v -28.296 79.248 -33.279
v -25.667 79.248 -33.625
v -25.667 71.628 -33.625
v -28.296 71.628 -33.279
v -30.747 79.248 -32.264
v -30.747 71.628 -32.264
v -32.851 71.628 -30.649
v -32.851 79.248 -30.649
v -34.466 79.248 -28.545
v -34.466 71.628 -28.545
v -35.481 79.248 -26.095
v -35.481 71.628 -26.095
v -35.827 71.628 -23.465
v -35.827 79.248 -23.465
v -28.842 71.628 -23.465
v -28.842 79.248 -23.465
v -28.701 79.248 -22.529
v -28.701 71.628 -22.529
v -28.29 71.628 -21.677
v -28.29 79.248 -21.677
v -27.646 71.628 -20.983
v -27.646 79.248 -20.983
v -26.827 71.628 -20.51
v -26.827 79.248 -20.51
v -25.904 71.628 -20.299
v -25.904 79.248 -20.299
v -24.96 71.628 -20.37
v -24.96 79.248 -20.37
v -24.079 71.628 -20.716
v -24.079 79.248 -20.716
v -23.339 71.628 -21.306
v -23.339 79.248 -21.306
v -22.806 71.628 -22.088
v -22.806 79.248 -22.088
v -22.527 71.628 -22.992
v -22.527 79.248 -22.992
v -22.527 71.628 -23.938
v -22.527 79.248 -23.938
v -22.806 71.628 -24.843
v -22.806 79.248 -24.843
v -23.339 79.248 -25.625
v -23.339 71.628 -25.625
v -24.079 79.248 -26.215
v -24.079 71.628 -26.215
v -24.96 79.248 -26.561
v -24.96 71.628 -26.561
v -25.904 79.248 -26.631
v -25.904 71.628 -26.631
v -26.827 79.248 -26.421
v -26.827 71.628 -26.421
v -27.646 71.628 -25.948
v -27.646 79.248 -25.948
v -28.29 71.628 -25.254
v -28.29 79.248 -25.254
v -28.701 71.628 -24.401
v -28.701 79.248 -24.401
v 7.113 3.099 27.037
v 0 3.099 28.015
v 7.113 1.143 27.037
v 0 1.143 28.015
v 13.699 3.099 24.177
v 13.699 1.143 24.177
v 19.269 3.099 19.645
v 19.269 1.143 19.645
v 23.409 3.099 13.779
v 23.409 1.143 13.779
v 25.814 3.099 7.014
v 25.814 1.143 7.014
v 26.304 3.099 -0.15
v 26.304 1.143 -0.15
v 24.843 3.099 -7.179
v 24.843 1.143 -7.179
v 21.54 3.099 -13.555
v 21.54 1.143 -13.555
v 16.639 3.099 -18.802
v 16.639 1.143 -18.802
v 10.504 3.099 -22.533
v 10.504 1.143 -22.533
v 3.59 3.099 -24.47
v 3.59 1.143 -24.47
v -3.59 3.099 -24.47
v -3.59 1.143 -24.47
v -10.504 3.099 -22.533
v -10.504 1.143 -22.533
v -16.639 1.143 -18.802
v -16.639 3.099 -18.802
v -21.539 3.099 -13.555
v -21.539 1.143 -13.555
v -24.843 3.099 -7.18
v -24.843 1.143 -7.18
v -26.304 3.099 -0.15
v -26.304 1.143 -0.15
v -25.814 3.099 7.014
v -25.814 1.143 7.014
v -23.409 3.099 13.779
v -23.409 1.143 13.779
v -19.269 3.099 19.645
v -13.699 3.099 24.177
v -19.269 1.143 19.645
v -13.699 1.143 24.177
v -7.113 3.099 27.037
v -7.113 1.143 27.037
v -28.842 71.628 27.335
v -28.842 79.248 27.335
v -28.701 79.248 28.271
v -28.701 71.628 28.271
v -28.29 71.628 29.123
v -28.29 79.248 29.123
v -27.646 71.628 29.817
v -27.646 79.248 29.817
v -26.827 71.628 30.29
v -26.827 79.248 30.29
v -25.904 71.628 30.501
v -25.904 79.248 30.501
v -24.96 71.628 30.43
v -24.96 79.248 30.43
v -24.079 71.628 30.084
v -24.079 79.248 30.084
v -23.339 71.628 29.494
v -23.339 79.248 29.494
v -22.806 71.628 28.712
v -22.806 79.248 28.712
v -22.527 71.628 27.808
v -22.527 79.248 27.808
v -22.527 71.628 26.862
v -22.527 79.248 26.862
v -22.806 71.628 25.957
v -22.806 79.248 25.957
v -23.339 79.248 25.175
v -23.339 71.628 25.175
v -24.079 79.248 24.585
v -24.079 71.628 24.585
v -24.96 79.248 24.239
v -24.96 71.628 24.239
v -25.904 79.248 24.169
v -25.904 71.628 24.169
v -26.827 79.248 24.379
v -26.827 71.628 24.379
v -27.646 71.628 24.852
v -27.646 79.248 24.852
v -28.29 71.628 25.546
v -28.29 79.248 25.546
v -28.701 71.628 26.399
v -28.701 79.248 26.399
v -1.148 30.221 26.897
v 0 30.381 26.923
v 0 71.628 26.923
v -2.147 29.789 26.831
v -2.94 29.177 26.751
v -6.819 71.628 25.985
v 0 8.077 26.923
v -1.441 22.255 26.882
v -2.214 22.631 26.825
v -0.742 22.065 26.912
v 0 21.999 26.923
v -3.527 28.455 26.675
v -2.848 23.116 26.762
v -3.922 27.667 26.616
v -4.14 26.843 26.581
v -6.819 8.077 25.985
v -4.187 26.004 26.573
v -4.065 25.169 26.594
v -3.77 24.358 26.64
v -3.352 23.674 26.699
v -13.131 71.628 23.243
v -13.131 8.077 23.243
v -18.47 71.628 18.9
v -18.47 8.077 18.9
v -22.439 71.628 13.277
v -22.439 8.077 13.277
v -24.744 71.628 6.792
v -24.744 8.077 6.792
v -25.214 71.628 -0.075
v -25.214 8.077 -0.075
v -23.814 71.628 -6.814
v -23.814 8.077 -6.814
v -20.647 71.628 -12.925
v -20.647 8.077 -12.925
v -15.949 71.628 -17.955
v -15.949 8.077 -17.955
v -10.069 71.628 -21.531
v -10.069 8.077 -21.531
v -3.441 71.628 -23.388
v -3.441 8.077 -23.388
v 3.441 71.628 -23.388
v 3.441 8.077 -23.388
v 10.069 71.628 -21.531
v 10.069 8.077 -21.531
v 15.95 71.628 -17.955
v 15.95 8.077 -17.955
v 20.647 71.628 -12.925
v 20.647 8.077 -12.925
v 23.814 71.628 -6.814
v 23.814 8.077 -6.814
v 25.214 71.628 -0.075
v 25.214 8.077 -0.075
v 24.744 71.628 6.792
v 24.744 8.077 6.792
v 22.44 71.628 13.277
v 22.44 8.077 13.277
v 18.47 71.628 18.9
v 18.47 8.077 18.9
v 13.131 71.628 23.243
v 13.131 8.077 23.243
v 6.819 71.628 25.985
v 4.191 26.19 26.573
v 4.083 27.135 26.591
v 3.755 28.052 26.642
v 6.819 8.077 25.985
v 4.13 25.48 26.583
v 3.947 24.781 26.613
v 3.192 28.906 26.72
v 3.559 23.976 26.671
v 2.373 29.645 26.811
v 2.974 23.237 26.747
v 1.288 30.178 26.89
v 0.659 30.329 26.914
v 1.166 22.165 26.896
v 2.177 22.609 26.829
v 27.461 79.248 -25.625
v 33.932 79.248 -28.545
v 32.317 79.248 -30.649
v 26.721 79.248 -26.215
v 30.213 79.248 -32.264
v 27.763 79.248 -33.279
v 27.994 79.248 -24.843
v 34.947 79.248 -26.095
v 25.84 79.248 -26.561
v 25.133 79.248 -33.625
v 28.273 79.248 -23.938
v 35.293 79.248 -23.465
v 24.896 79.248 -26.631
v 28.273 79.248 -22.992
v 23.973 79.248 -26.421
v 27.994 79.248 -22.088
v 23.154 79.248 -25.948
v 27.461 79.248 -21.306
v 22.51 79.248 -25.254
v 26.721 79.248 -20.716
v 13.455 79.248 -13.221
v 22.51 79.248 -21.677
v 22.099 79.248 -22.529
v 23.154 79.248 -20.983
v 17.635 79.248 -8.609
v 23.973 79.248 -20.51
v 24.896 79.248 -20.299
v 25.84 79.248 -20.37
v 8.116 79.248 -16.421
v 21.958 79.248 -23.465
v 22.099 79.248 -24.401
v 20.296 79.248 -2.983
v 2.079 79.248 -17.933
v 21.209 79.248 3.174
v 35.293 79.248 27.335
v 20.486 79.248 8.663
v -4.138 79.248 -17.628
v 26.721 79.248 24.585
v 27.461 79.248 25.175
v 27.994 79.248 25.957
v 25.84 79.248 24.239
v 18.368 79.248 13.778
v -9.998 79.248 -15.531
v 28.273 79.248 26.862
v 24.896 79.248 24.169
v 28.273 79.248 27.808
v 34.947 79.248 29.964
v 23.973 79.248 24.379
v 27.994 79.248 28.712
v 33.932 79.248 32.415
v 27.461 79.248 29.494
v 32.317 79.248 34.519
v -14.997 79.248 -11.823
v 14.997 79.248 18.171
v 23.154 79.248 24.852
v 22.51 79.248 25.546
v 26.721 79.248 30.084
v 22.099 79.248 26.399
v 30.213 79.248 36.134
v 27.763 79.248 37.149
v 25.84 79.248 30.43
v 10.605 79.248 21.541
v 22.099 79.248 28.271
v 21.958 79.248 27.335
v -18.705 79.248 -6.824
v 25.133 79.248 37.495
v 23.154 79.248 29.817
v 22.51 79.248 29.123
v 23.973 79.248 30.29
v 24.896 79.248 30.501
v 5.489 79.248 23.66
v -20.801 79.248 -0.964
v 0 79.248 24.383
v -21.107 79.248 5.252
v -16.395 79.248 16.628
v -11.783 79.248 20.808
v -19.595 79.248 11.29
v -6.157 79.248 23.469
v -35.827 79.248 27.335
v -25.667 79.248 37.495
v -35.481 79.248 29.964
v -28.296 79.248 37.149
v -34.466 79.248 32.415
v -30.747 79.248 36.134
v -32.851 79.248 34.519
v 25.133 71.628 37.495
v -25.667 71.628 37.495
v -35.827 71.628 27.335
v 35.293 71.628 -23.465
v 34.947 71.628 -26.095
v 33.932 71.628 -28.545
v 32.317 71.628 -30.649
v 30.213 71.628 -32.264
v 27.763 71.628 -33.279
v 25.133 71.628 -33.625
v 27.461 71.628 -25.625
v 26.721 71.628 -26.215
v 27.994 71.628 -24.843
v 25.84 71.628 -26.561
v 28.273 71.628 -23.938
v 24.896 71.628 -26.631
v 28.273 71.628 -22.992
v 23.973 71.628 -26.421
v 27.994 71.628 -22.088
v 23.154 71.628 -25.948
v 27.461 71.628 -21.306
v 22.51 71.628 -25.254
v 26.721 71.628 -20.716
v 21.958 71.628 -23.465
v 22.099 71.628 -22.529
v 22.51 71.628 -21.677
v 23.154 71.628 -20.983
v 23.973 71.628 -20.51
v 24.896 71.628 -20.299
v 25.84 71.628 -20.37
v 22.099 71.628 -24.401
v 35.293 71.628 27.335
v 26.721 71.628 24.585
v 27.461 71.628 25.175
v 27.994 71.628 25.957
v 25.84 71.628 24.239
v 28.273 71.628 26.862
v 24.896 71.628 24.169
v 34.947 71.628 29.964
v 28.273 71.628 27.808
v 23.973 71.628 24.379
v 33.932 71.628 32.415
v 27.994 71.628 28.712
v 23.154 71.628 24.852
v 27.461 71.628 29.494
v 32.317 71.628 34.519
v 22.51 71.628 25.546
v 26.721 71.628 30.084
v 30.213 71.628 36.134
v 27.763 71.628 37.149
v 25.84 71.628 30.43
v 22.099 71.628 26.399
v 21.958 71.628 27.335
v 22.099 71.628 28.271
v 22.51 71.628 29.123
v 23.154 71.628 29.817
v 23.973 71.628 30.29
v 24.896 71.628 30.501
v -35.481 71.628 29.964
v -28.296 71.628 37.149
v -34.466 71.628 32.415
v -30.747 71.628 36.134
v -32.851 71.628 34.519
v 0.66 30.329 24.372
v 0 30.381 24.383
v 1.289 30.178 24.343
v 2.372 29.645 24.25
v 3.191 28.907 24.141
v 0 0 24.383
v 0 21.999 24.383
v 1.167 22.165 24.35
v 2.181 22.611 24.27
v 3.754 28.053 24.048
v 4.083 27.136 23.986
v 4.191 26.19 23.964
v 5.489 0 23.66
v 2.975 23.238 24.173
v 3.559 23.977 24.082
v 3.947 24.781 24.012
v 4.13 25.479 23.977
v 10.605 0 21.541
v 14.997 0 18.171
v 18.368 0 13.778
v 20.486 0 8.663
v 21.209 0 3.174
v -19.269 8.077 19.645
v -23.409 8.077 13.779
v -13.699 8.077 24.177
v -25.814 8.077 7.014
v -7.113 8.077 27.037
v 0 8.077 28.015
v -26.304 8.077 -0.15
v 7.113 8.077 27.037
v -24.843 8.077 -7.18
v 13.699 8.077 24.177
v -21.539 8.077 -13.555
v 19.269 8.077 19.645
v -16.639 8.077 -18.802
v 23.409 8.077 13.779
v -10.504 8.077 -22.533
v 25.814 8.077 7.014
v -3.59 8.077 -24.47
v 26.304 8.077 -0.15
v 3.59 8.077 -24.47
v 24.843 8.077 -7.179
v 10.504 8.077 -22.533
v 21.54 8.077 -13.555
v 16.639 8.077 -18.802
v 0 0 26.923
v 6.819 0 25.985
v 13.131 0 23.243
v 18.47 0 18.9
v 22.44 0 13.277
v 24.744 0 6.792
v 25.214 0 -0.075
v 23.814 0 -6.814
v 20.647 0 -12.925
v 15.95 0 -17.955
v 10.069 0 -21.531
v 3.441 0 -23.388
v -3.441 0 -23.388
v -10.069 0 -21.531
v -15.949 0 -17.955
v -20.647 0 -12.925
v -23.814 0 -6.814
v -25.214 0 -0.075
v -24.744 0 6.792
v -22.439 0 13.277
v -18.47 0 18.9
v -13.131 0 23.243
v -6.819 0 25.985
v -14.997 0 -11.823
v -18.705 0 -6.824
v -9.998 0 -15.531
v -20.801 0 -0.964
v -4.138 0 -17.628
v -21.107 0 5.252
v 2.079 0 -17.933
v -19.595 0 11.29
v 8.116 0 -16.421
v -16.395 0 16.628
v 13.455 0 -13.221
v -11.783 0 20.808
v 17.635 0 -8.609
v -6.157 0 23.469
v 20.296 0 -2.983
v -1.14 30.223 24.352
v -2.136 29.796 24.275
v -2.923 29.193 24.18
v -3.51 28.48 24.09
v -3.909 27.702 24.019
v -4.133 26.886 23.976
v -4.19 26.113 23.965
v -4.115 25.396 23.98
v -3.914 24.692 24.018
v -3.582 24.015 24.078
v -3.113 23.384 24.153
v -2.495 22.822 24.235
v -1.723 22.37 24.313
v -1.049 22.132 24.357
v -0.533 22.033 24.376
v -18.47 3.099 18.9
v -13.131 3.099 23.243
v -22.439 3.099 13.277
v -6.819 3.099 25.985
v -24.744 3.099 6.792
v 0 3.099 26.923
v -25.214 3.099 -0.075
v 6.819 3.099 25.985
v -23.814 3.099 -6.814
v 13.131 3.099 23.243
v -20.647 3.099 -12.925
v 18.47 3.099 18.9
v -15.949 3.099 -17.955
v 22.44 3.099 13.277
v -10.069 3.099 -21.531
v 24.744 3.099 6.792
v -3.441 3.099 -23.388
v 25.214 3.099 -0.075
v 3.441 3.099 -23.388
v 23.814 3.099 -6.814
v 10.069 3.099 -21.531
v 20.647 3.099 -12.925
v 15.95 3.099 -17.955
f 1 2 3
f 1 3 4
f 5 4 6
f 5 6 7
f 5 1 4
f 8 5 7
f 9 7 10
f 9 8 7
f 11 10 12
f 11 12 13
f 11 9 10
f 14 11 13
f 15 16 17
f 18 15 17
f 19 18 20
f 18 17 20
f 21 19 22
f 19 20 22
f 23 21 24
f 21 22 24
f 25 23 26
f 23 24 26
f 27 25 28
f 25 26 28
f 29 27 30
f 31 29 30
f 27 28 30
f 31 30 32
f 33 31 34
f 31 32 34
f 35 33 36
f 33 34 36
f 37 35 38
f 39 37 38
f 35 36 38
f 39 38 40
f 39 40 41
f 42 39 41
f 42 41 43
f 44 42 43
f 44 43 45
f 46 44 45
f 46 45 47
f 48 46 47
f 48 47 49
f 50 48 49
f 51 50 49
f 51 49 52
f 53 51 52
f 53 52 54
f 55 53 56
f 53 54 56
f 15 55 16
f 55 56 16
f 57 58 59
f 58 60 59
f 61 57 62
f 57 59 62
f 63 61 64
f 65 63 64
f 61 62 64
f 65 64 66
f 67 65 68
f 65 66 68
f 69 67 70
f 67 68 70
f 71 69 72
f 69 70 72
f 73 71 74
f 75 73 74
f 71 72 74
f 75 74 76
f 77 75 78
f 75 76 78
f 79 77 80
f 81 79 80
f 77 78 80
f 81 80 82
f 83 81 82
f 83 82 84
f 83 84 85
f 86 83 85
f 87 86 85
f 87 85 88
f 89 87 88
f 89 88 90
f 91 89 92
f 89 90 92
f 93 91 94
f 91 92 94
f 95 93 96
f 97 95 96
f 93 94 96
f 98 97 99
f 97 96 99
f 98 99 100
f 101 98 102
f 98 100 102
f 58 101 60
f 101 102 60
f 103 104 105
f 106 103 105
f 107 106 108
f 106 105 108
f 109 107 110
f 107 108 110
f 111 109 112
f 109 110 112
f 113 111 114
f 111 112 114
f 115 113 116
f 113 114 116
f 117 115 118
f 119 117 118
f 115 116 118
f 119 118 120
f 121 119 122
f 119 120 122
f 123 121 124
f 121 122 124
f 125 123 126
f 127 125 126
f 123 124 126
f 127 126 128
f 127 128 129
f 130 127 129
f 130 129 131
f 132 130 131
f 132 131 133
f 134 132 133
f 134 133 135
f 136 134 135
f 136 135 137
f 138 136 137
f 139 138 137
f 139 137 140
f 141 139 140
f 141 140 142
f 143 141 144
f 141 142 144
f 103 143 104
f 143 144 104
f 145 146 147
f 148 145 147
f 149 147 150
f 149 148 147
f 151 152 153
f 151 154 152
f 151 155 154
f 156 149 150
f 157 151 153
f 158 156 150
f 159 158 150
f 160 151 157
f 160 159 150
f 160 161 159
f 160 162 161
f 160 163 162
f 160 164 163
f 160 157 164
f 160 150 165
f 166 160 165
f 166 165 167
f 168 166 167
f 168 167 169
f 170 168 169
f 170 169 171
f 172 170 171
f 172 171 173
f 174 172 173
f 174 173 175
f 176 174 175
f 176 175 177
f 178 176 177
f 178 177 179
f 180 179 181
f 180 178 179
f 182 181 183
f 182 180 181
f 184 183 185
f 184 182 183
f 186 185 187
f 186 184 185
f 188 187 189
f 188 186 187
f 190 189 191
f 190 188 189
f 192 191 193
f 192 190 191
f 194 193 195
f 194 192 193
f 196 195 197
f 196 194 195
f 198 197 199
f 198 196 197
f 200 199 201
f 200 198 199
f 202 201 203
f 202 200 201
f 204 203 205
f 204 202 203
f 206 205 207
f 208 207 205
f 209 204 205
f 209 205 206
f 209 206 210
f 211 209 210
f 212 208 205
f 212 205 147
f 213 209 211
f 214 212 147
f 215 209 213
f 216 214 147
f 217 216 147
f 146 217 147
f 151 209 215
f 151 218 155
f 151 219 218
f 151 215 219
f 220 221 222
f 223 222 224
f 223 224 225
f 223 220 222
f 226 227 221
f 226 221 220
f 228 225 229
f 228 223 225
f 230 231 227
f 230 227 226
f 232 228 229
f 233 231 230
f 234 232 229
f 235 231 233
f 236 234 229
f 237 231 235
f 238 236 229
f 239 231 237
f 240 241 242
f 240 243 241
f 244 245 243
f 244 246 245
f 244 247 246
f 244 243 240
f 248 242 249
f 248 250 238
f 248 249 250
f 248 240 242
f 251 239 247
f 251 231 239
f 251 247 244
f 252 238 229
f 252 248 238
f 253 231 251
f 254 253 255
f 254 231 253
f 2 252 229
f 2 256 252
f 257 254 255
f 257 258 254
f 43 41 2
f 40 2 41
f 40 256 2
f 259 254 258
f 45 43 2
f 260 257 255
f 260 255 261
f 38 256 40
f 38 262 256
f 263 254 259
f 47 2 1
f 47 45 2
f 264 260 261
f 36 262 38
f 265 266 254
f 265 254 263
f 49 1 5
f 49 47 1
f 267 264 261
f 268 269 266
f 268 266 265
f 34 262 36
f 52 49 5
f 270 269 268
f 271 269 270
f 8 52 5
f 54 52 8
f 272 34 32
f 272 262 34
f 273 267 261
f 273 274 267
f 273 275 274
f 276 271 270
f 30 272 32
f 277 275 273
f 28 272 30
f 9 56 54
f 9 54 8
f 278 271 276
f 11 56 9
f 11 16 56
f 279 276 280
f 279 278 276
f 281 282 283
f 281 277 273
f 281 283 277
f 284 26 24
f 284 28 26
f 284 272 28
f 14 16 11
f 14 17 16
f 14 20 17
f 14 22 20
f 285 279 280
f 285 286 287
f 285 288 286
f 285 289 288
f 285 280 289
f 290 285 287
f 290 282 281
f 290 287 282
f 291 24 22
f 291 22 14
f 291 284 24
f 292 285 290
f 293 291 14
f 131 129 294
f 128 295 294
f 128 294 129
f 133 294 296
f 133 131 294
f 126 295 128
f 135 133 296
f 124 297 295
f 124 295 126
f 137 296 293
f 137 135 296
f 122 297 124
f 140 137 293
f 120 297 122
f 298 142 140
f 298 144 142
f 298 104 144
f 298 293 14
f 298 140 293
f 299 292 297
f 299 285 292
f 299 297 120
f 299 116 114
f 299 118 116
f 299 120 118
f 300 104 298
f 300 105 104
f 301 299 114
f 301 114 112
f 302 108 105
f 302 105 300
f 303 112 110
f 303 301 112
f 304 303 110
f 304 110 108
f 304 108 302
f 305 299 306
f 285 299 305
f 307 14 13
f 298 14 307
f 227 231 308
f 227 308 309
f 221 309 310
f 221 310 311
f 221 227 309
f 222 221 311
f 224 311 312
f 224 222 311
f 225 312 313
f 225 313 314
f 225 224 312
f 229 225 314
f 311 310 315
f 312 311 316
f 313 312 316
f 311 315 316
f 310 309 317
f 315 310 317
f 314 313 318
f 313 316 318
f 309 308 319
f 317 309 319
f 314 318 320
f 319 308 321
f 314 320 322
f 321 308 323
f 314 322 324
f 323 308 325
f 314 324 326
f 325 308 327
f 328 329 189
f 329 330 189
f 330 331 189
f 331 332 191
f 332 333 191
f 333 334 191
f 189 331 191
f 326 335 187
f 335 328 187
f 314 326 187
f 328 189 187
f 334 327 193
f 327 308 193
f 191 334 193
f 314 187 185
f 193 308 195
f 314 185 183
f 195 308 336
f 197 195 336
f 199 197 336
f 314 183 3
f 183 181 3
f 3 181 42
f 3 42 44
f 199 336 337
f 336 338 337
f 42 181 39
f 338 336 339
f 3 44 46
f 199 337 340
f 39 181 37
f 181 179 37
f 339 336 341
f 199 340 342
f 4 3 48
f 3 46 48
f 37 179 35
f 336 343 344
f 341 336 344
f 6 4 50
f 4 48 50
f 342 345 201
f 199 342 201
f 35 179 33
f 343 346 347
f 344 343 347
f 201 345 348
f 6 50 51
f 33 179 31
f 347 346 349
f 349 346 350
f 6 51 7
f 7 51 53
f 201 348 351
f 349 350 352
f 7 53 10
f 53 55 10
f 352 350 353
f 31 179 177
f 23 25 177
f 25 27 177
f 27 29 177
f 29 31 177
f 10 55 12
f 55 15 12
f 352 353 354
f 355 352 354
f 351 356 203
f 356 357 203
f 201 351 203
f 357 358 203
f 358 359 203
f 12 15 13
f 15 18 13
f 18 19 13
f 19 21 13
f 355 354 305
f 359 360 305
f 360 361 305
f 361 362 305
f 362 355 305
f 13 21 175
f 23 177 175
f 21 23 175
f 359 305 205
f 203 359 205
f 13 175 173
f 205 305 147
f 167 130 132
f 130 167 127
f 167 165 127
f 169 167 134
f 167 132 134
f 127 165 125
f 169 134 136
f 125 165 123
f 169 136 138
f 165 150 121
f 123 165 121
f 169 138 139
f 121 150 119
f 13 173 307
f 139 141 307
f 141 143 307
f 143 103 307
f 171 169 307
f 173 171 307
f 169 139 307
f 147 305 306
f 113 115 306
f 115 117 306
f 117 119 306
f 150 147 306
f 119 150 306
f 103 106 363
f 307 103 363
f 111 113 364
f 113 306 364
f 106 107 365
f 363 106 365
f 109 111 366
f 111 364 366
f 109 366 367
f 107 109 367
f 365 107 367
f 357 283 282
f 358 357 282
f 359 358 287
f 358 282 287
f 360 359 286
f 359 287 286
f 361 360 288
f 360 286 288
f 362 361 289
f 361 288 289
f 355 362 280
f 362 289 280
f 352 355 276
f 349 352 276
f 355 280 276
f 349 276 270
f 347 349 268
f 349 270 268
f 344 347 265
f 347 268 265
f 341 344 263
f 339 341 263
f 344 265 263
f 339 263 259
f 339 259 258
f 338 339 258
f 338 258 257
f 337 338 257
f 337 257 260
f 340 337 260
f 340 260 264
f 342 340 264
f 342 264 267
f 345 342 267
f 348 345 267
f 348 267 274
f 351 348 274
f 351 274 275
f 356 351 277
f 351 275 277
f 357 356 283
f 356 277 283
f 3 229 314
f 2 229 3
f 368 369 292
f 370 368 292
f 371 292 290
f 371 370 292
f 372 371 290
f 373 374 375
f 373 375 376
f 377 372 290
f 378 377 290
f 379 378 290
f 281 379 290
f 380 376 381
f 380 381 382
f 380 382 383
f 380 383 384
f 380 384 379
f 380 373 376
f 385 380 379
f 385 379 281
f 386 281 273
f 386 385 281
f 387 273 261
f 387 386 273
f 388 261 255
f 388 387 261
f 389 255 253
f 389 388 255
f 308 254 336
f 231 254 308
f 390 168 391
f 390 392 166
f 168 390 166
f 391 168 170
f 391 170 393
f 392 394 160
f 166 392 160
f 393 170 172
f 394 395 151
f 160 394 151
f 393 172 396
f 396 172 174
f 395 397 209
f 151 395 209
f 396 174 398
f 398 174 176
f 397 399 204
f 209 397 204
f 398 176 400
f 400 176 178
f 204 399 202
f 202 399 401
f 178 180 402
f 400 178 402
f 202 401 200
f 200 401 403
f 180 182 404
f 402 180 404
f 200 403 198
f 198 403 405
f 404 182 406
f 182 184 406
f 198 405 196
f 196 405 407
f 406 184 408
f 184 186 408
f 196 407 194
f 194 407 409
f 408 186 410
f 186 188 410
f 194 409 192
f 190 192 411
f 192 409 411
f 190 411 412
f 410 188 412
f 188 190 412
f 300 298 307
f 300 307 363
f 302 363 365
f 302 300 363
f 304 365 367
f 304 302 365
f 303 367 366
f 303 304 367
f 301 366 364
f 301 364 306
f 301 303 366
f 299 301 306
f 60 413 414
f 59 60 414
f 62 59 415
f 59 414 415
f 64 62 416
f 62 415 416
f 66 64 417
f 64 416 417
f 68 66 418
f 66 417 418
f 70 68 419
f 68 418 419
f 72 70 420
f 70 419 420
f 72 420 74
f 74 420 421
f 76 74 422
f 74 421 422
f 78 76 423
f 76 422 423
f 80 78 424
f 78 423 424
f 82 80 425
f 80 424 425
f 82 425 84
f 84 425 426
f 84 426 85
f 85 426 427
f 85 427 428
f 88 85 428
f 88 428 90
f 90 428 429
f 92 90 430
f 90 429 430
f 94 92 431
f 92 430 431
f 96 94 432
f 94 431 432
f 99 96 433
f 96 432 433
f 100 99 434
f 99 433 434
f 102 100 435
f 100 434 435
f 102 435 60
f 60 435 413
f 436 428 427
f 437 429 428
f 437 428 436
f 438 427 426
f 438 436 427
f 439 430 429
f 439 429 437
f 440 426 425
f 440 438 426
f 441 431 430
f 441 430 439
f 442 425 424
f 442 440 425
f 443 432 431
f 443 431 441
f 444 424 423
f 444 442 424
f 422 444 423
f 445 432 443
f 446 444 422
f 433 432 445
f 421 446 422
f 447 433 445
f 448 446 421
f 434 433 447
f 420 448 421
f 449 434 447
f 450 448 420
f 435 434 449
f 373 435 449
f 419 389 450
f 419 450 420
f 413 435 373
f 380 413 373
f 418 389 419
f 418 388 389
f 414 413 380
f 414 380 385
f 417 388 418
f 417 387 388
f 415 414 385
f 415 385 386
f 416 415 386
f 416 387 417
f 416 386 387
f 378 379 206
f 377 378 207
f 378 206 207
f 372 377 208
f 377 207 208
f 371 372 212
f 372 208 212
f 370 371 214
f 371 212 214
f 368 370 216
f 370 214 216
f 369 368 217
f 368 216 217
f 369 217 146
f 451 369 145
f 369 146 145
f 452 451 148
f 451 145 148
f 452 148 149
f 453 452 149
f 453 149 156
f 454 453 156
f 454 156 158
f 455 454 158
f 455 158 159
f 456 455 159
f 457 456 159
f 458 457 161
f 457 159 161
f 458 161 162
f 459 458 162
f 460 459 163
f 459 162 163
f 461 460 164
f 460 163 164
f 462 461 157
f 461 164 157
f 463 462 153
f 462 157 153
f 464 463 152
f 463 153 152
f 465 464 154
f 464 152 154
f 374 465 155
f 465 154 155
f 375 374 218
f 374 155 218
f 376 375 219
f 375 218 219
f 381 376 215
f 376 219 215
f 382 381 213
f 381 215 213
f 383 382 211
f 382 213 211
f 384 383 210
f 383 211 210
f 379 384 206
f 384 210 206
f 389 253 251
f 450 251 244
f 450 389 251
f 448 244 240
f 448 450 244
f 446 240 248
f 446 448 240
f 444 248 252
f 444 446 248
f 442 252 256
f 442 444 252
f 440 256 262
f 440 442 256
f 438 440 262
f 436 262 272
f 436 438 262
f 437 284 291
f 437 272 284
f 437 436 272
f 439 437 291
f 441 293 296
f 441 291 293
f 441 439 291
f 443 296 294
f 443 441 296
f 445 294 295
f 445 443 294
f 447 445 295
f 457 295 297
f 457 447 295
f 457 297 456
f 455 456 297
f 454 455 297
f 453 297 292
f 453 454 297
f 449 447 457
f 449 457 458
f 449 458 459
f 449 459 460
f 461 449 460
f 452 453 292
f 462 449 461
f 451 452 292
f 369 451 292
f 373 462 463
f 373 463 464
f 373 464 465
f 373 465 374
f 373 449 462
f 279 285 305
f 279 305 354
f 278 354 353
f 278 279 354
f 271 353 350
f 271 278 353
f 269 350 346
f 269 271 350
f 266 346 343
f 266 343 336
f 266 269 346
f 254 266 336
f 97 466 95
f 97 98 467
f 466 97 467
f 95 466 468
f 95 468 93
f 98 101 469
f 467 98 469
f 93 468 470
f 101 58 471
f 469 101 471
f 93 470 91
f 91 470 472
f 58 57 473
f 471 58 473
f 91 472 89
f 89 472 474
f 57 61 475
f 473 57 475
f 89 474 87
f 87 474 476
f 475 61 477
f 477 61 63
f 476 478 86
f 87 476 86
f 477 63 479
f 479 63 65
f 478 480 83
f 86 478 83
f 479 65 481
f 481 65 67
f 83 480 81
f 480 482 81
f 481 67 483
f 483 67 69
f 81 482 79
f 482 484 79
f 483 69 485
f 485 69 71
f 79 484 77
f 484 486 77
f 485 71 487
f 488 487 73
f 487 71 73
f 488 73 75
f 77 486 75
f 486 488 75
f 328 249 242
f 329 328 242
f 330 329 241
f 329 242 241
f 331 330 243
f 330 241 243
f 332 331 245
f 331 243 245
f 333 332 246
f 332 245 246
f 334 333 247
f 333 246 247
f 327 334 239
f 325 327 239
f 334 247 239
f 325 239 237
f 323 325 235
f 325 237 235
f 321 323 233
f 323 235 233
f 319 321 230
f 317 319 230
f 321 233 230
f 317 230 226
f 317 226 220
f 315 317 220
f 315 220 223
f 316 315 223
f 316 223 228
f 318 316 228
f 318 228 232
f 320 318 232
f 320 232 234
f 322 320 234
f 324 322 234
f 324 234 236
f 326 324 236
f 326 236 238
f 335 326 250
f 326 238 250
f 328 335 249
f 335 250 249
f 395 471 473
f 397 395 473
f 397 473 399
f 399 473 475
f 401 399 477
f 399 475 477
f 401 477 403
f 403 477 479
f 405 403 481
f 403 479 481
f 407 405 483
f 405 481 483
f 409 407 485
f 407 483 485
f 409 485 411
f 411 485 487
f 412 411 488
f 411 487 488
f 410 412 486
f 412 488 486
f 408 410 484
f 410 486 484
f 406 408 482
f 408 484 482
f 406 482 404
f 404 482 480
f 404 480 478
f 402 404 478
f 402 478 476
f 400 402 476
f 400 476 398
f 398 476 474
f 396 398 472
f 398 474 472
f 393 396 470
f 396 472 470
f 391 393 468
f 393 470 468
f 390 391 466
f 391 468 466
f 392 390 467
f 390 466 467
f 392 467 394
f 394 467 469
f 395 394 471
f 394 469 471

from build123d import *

# Parameters (mm, degrees)
F1_DEPTH  = 79.248
F3_DEPTH  = 11.2522
F6_R      = 3.175
F6_R_2    = 25.273
F6_R_3    = 21.209
F7_DEPTH  = 7.62
F9_R      = 4.191
F10_DEPTH = 7.874


# Not quite as in the source:
# - ends of sketch curves that miss each other by under 0.0002 mm in the source are joined
# - a feature names something its author has since deleted; it is built from what else it names


with BuildPart() as f1:
    # F0 (on Front) → F1 (new body)
    with BuildSketch(Plane.XZ):
        with BuildLine():
            ThreePointArc((25.2730608729, 1.6496396764), (17.870749032, 19.5203708791), (0, 26.9226396763))
            ThreePointArc((0, 26.9226396763), (-17.8706272863, -16.2210915263), (25.2730608729, 1.6496396764))
        make_face()
        with BuildLine():
            ThreePointArc((0, 24.3826396763), (14.9970630949, 18.1706867446), (21.2090547187, 3.1736396764))
            ThreePointArc((21.2090547187, 3.1736396764), (-14.9969536575, -11.8234073918), (0, 24.3826396763))
        make_face(mode=Mode.SUBTRACT)
    extrude(amount=-F1_DEPTH)

    # F2 (on face) → F3 (cut)
    with BuildSketch(Plane.XZ):
        with BuildLine():
            Line((24.13, 26.9226396763), (0, 26.9226396763))
            ThreePointArc((0, 26.9226396763), (8.7356829544, 25.3648971249), (16.3944827501, 20.8836579854))
            Line((16.3944827501, 20.8836579854), (24.13, 20.8835978808))
            Line((24.13, 20.8835978808), (24.13, 26.9226396763))
        make_face()
        with BuildLine():
            ThreePointArc((-16.3944315191, 20.8835978808), (-8.7356618013, 25.3648600709), (0, 26.9226396763))
            Line((0, 26.9226396763), (-24.13, 26.9226396763))
            Line((-24.13, 26.9226396763), (-24.13, 20.8835978808))
            Line((-24.13, 20.8835978808), (-16.3944315191, 20.8835978808))
        make_face()
    extrude(amount=-F3_DEPTH, mode=Mode.SUBTRACT)

    # F4 (on Right) → F5 (revolve)
    with BuildSketch(Plane.YZ):
        Polygon((1.143, 28.0148396764), (0, 26.9226396764), (3.0988, 26.9226396764), (3.0988, 28.0148396764), align=None)
        Polygon((8.0772, 28.0148396764), (3.0988, 26.9226396764), (8.0772, 26.9226396764), align=None)
    revolve(axis=Axis((6.08729e-05, 0, 1.6496396764), (0, 1, 0)))

    # F6 (on face) → F7 (join)
    with BuildSketch(Plane(origin=(0, 79.248, 0), x_dir=(-1, 0, 0), z_dir=(0, 1, 0))):
        with BuildLine():
            Line((-25.1332705243, -33.6252276427), (25.6667294757, -33.6252276427))
            ThreePointArc((25.6667294757, -33.6252276427), (32.8509343726, -30.6494325395), (35.8267294757, -23.4652276427))
            Line((35.8267294757, -23.4652276427), (35.8267294757, 27.3347723573))
            ThreePointArc((35.8267294757, 27.3347723573), (32.8509343726, 34.5189772542), (25.6667294757, 37.4947723573))
            Line((25.6667294757, 37.4947723573), (-25.1332705243, 37.4947723573))
            ThreePointArc((-25.1332705243, 37.4947723573), (-32.3174754212, 34.5189772542), (-35.2932705243, 27.3347723573))
            Line((-35.2932705243, 27.3347723573), (-35.2932705243, -23.4652276427))
            ThreePointArc((-35.2932705243, -23.4652276427), (-32.3174754212, -30.6494325395), (-25.1332705243, -33.6252276427))
        make_face()
        with Locations((-25.1332705243, -23.4652276427)):
            Circle(F6_R, mode=Mode.SUBTRACT)
        with Locations((-6.08729e-05, 1.6496396764)):
            Circle(F6_R_2, mode=Mode.SUBTRACT)
        with Locations((25.6667294757, -23.4652276427)):
            Circle(F6_R, mode=Mode.SUBTRACT)
        with Locations((-25.1332705243, 27.3347723573)):
            Circle(F6_R, mode=Mode.SUBTRACT)
        with Locations((25.6667294757, 27.3347723573)):
            Circle(F6_R, mode=Mode.SUBTRACT)
        with Locations((-6.08729e-05, 1.6496396764)):
            Circle(F6_R_2)
        with Locations((-5.47187e-05, 3.1736396764)):
            Circle(F6_R_3, mode=Mode.SUBTRACT)
    extrude(amount=-F7_DEPTH)

    # F9 (on offset) → F10 (cut)
    with BuildSketch(Plane.XY.offset(28.448)):
        with Locations((4.8756e-06, 26.1899903387)):
            Circle(F9_R)
    extrude(amount=-F10_DEPTH, mode=Mode.SUBTRACT)


solid = f1.part
